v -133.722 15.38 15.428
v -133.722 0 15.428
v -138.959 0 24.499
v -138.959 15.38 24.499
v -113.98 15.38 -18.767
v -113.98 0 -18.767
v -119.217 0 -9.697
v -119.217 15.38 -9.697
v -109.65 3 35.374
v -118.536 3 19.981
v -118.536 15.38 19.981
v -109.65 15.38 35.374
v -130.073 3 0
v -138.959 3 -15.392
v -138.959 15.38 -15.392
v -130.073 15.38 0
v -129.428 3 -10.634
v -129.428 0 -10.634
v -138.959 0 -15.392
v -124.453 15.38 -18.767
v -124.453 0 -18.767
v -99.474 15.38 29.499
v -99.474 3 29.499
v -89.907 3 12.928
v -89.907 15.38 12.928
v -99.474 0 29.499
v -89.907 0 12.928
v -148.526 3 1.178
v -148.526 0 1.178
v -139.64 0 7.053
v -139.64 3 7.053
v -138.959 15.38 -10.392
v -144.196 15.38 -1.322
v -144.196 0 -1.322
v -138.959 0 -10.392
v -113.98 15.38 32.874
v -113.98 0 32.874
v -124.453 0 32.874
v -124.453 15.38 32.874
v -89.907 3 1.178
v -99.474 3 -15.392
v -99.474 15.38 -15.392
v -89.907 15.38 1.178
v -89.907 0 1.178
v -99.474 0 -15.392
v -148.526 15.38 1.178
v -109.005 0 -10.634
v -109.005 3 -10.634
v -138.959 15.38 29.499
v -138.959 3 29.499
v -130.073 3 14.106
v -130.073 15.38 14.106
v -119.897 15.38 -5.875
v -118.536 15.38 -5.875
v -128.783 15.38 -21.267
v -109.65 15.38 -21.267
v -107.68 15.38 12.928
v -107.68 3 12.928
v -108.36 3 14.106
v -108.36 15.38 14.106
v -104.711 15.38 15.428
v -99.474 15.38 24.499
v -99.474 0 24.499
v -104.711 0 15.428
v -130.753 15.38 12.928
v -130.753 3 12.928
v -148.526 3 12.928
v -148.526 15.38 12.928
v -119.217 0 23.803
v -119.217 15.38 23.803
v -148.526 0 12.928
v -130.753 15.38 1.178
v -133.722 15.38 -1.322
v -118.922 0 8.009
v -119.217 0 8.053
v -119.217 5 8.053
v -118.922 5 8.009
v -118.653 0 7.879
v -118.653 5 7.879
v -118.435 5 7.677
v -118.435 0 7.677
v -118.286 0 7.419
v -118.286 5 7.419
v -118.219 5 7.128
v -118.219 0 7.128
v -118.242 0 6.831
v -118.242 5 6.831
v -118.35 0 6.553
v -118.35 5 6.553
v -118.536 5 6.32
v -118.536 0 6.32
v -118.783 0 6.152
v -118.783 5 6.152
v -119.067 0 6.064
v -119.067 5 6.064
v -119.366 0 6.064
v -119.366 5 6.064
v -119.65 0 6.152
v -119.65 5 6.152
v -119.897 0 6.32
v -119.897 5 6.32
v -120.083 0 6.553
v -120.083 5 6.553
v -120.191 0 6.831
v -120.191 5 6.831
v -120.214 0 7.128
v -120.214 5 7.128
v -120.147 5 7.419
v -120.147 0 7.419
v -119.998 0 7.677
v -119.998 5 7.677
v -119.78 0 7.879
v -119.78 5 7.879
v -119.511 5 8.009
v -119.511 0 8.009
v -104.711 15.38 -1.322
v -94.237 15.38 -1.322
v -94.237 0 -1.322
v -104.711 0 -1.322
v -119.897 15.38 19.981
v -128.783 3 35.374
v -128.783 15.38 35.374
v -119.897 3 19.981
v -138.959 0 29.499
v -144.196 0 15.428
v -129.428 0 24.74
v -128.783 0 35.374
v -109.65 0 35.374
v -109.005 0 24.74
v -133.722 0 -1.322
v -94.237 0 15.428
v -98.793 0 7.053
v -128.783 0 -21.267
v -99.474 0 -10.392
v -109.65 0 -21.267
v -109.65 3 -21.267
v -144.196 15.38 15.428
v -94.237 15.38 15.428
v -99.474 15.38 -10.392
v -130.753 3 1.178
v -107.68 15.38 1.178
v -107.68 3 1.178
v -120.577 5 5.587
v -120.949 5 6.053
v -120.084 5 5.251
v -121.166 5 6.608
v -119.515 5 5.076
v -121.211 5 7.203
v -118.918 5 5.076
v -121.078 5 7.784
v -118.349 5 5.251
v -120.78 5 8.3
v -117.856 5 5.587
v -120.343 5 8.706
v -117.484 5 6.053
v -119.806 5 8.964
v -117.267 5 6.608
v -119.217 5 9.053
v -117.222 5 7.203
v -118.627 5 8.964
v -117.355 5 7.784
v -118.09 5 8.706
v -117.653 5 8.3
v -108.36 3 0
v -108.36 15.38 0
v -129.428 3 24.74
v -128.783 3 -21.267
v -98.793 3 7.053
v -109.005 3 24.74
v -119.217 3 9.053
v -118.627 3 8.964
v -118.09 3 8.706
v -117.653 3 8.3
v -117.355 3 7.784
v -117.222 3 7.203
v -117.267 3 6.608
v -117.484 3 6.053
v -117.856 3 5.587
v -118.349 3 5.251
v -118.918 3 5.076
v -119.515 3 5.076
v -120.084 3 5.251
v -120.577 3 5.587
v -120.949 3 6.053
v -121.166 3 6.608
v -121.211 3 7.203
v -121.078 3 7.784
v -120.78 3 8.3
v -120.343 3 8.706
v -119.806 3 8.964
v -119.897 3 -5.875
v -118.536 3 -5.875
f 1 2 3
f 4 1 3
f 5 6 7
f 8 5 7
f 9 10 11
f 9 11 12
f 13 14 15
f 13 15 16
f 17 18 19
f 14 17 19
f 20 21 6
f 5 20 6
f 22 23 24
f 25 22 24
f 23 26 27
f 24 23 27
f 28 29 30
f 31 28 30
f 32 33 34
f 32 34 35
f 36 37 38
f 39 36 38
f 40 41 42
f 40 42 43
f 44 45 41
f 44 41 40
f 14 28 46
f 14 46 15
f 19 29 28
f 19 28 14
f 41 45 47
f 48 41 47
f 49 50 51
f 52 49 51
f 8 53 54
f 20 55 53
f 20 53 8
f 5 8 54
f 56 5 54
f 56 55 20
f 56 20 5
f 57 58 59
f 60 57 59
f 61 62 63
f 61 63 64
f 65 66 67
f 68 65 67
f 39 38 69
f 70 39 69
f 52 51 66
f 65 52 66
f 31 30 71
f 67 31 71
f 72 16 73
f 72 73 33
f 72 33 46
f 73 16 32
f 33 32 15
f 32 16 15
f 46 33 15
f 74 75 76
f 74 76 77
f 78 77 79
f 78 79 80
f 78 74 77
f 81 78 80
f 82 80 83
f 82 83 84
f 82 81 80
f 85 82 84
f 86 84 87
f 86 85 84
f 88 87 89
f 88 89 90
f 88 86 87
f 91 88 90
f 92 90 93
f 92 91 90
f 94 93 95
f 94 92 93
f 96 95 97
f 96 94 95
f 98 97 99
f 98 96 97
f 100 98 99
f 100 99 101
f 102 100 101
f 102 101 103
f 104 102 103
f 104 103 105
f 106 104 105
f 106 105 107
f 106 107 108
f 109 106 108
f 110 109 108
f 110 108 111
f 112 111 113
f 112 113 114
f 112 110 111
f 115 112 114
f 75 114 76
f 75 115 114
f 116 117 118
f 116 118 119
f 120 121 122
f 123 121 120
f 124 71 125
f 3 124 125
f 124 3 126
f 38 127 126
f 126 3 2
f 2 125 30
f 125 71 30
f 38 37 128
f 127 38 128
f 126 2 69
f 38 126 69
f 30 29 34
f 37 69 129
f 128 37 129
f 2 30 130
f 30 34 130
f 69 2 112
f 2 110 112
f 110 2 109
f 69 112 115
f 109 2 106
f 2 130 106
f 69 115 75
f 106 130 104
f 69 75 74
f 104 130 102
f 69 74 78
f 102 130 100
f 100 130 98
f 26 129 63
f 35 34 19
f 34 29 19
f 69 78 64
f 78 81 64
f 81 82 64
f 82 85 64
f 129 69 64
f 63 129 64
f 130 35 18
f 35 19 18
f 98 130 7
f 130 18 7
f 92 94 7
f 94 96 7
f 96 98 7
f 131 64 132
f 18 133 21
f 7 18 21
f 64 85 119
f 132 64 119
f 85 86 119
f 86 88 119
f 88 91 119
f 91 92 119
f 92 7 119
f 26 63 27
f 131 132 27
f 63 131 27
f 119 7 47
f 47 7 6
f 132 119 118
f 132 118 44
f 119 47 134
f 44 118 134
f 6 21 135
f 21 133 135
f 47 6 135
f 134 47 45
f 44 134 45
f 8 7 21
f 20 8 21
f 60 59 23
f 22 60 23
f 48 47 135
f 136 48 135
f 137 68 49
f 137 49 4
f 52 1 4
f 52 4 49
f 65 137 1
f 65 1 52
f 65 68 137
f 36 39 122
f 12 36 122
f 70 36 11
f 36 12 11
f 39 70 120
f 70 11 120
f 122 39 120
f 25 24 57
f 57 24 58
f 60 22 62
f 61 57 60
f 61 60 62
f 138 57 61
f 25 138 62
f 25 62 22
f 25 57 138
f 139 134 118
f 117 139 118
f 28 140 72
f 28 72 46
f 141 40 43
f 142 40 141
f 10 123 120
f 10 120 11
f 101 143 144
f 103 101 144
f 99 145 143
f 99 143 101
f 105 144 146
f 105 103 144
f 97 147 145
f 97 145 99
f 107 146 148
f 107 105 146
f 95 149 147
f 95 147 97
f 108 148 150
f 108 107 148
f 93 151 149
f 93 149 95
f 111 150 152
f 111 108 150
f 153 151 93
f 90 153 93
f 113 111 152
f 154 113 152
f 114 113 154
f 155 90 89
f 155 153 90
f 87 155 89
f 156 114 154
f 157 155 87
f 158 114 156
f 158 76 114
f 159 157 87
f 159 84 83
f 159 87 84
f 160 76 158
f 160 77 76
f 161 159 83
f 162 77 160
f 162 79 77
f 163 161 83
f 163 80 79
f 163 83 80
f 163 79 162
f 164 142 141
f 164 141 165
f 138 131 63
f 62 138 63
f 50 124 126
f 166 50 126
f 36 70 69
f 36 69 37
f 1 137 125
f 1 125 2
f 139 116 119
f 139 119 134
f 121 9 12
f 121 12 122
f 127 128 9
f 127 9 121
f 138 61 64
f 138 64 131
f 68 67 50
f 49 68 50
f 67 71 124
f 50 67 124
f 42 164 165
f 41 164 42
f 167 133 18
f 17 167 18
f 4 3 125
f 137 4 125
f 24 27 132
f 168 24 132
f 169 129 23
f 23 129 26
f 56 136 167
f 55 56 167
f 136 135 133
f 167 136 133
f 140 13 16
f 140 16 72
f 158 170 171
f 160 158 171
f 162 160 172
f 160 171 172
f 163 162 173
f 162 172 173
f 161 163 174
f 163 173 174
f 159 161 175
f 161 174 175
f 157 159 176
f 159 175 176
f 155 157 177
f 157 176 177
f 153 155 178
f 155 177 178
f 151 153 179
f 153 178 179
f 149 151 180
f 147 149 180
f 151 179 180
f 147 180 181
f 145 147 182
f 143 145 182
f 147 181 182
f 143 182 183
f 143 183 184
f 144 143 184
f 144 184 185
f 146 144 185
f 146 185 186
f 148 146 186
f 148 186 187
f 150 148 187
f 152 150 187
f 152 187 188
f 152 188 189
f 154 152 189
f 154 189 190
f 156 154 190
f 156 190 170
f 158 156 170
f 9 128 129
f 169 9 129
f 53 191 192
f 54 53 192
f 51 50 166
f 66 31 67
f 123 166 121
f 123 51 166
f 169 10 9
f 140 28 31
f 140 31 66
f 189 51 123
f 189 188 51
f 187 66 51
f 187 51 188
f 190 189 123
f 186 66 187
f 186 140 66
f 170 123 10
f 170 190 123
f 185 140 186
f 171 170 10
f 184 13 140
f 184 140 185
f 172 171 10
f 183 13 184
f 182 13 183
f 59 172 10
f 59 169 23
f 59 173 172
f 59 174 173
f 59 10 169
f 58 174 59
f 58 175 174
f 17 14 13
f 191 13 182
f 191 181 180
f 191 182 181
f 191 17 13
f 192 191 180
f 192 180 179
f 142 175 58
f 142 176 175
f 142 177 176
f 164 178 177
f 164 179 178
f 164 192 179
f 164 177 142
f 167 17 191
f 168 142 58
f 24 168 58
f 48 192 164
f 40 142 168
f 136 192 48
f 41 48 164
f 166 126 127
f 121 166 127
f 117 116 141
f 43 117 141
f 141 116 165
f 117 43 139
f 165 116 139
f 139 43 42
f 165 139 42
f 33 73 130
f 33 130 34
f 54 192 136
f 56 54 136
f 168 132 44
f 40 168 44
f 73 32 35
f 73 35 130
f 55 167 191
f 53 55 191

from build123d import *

# Parameters (mm, degrees)
BOSS_EXTRUDE3_DEPTH   = 15.38
BOSS_EXTRUDE3_2_DEPTH = 15.38
BOSS_EXTRUDE3_3_DEPTH = 15.38
BOSS_EXTRUDE3_4_DEPTH = 15.38
BOSS_EXTRUDE3_5_DEPTH = 15.38
BOSS_EXTRUDE3_6_DEPTH = 15.38
SKETCH1_7_R           = 2
BOSS_EXTRUDE5_DEPTH   = 3
SKETCH1_8_R           = 2
SKETCH1_8_R_2         = 1
BOSS_EXTRUDE6_DEPTH   = 5


with BuildPart() as part:
    # Sketch1 → Boss-Extrude3 (new body)
    with BuildSketch(Plane(origin=(0, 0, 0), x_dir=(1, 0, 0), z_dir=(0, 1, 0))):
        Polygon((-109.649519053, 21.267304845), (-128.783493648, 21.267304845), (-119.896742302, 5.875), (-118.536270399, 5.875), align=None)
        Polygon((-124.453366629, 18.767304845), (-113.979646072, 18.767304845), (-119.216506351, 9.69679677), align=None, mode=Mode.SUBTRACT)
    extrude(amount=BOSS_EXTRUDE3_DEPTH)



with BuildPart() as body_2:
    # Sketch1 → Boss-Extrude3 2 (new body)
    with BuildSketch(Plane(origin=(0, 0, 0), x_dir=(1, 0, 0), z_dir=(0, 1, 0))):
        Polygon((-130.072540797, 0), (-138.959292143, 15.392304845), (-148.526279441, -1.17820323), (-130.752776749, -1.17820323), align=None)
        Polygon((-133.722431864, 1.32179677), (-144.196152422, 1.32179677), (-138.959292143, 10.392304845), align=None, mode=Mode.SUBTRACT)
    extrude(amount=BOSS_EXTRUDE3_2_DEPTH)


with BuildPart() as body_3:
    # Sketch1 → Boss-Extrude3 3 (new body)
    with BuildSketch(Plane(origin=(0, 0, 0), x_dir=(1, 0, 0), z_dir=(0, 1, 0))):
        Polygon((-89.906733261, -1.17820323), (-99.473720558, 15.392304845), (-108.360471904, 0), (-107.680235952, -1.17820323), align=None)
        Polygon((-104.710580837, 1.32179677), (-99.473720558, 10.392304845), (-94.23686028, 1.32179677), align=None, mode=Mode.SUBTRACT)
    extrude(amount=BOSS_EXTRUDE3_3_DEPTH)


with BuildPart() as body_4:
    # Sketch1 → Boss-Extrude3 4 (new body)
    with BuildSketch(Plane(origin=(0, 0, 0), x_dir=(1, 0, 0), z_dir=(0, 1, 0))):
        Polygon((-130.752776749, -12.92820323), (-148.526279441, -12.92820323), (-138.959292143, -29.498711305), (-130.072540797, -14.106406459), align=None)
        Polygon((-138.959292143, -24.498711305), (-144.196152422, -15.42820323), (-133.722431864, -15.42820323), align=None, mode=Mode.SUBTRACT)
    extrude(amount=BOSS_EXTRUDE3_4_DEPTH)


with BuildPart() as body_5:
    # Sketch1 → Boss-Extrude3 5 (new body)
    with BuildSketch(Plane(origin=(0, 0, 0), x_dir=(1, 0, 0), z_dir=(0, 1, 0))):
        Polygon((-99.473720558, -29.498711305), (-89.906733261, -12.92820323), (-107.680235952, -12.92820323), (-108.360471904, -14.106406459), align=None)
        Polygon((-94.23686028, -15.42820323), (-99.473720558, -24.498711305), (-104.710580837, -15.42820323), align=None, mode=Mode.SUBTRACT)
    extrude(amount=BOSS_EXTRUDE3_5_DEPTH)


with BuildPart() as body_6:
    # Sketch1 → Boss-Extrude3 6 (new body)
    with BuildSketch(Plane(origin=(0, 0, 0), x_dir=(1, 0, 0), z_dir=(0, 1, 0))):
        Polygon((-119.896742302, -19.981406459), (-128.783493648, -35.373711305), (-109.649519053, -35.373711305), (-118.536270399, -19.981406459), align=None)
        Polygon((-119.216506351, -23.80320323), (-113.979646072, -32.873711305), (-124.453366629, -32.873711305), align=None, mode=Mode.SUBTRACT)
    extrude(amount=BOSS_EXTRUDE3_6_DEPTH)


with BuildPart() as part_1:
    add(part.part)

    add(body_2.part)  # Boss-Extrude5 merges body 2

    add(body_3.part)  # Boss-Extrude5 merges body 3

    add(body_4.part)  # Boss-Extrude5 merges body 4

    add(body_5.part)  # Boss-Extrude5 merges body 5

    add(body_6.part)  # Boss-Extrude5 merges body 6
    # Sketch1<7> → Boss-Extrude5 (add)
    with BuildSketch(Plane(origin=(0, 0, 0), x_dir=(1, 0, 0), z_dir=(0, 1, 0))):
        Polygon((-119.896742302, 5.875), (-128.783493648, 21.267304845), (-129.428017223, 10.633652423), (-138.959292143, 15.392304845), (-130.072540797, 0), (-130.752776749, -1.17820323), (-148.526279441, -1.17820323), (-139.639528095, -7.05320323), (-148.526279441, -12.92820323), (-130.752776749, -12.92820323), (-130.072540797, -14.106406459), (-138.959292143, -29.498711305), (-129.428017223, -24.740058882), (-128.783493648, -35.373711305), (-119.896742302, -19.981406459), (-118.536270399, -19.981406459), (-109.649519053, -35.373711305), (-109.004995479, -24.740058882), (-99.473720558, -29.498711305), (-108.360471904, -14.106406459), (-107.680235952, -12.92820323), (-89.906733261, -12.92820323), (-98.793484607, -7.05320323), (-89.906733261, -1.17820323), (-107.680235952, -1.17820323), (-108.360471904, 0), (-99.473720558, 15.392304845), (-109.004995479, 10.633652423), (-109.649519053, 21.267304845), (-118.536270399, 5.875), align=None)
        with Locations((-119.216506351, -7.05320323)):
            Circle(SKETCH1_7_R, mode=Mode.SUBTRACT)
    extrude(amount=BOSS_EXTRUDE5_DEPTH)

    # Sketch1<8> → Boss-Extrude6 (add)
    with BuildSketch(Plane(origin=(0, 0, 0), x_dir=(1, 0, 0), z_dir=(0, 1, 0))):
        with Locations((-119.216506351, -7.05320323)):
            Circle(SKETCH1_8_R)
        with Locations((-119.216506351, -7.05320323)):
            Circle(SKETCH1_8_R_2, mode=Mode.SUBTRACT)
    extrude(amount=BOSS_EXTRUDE6_DEPTH)


solid = part_1.part
